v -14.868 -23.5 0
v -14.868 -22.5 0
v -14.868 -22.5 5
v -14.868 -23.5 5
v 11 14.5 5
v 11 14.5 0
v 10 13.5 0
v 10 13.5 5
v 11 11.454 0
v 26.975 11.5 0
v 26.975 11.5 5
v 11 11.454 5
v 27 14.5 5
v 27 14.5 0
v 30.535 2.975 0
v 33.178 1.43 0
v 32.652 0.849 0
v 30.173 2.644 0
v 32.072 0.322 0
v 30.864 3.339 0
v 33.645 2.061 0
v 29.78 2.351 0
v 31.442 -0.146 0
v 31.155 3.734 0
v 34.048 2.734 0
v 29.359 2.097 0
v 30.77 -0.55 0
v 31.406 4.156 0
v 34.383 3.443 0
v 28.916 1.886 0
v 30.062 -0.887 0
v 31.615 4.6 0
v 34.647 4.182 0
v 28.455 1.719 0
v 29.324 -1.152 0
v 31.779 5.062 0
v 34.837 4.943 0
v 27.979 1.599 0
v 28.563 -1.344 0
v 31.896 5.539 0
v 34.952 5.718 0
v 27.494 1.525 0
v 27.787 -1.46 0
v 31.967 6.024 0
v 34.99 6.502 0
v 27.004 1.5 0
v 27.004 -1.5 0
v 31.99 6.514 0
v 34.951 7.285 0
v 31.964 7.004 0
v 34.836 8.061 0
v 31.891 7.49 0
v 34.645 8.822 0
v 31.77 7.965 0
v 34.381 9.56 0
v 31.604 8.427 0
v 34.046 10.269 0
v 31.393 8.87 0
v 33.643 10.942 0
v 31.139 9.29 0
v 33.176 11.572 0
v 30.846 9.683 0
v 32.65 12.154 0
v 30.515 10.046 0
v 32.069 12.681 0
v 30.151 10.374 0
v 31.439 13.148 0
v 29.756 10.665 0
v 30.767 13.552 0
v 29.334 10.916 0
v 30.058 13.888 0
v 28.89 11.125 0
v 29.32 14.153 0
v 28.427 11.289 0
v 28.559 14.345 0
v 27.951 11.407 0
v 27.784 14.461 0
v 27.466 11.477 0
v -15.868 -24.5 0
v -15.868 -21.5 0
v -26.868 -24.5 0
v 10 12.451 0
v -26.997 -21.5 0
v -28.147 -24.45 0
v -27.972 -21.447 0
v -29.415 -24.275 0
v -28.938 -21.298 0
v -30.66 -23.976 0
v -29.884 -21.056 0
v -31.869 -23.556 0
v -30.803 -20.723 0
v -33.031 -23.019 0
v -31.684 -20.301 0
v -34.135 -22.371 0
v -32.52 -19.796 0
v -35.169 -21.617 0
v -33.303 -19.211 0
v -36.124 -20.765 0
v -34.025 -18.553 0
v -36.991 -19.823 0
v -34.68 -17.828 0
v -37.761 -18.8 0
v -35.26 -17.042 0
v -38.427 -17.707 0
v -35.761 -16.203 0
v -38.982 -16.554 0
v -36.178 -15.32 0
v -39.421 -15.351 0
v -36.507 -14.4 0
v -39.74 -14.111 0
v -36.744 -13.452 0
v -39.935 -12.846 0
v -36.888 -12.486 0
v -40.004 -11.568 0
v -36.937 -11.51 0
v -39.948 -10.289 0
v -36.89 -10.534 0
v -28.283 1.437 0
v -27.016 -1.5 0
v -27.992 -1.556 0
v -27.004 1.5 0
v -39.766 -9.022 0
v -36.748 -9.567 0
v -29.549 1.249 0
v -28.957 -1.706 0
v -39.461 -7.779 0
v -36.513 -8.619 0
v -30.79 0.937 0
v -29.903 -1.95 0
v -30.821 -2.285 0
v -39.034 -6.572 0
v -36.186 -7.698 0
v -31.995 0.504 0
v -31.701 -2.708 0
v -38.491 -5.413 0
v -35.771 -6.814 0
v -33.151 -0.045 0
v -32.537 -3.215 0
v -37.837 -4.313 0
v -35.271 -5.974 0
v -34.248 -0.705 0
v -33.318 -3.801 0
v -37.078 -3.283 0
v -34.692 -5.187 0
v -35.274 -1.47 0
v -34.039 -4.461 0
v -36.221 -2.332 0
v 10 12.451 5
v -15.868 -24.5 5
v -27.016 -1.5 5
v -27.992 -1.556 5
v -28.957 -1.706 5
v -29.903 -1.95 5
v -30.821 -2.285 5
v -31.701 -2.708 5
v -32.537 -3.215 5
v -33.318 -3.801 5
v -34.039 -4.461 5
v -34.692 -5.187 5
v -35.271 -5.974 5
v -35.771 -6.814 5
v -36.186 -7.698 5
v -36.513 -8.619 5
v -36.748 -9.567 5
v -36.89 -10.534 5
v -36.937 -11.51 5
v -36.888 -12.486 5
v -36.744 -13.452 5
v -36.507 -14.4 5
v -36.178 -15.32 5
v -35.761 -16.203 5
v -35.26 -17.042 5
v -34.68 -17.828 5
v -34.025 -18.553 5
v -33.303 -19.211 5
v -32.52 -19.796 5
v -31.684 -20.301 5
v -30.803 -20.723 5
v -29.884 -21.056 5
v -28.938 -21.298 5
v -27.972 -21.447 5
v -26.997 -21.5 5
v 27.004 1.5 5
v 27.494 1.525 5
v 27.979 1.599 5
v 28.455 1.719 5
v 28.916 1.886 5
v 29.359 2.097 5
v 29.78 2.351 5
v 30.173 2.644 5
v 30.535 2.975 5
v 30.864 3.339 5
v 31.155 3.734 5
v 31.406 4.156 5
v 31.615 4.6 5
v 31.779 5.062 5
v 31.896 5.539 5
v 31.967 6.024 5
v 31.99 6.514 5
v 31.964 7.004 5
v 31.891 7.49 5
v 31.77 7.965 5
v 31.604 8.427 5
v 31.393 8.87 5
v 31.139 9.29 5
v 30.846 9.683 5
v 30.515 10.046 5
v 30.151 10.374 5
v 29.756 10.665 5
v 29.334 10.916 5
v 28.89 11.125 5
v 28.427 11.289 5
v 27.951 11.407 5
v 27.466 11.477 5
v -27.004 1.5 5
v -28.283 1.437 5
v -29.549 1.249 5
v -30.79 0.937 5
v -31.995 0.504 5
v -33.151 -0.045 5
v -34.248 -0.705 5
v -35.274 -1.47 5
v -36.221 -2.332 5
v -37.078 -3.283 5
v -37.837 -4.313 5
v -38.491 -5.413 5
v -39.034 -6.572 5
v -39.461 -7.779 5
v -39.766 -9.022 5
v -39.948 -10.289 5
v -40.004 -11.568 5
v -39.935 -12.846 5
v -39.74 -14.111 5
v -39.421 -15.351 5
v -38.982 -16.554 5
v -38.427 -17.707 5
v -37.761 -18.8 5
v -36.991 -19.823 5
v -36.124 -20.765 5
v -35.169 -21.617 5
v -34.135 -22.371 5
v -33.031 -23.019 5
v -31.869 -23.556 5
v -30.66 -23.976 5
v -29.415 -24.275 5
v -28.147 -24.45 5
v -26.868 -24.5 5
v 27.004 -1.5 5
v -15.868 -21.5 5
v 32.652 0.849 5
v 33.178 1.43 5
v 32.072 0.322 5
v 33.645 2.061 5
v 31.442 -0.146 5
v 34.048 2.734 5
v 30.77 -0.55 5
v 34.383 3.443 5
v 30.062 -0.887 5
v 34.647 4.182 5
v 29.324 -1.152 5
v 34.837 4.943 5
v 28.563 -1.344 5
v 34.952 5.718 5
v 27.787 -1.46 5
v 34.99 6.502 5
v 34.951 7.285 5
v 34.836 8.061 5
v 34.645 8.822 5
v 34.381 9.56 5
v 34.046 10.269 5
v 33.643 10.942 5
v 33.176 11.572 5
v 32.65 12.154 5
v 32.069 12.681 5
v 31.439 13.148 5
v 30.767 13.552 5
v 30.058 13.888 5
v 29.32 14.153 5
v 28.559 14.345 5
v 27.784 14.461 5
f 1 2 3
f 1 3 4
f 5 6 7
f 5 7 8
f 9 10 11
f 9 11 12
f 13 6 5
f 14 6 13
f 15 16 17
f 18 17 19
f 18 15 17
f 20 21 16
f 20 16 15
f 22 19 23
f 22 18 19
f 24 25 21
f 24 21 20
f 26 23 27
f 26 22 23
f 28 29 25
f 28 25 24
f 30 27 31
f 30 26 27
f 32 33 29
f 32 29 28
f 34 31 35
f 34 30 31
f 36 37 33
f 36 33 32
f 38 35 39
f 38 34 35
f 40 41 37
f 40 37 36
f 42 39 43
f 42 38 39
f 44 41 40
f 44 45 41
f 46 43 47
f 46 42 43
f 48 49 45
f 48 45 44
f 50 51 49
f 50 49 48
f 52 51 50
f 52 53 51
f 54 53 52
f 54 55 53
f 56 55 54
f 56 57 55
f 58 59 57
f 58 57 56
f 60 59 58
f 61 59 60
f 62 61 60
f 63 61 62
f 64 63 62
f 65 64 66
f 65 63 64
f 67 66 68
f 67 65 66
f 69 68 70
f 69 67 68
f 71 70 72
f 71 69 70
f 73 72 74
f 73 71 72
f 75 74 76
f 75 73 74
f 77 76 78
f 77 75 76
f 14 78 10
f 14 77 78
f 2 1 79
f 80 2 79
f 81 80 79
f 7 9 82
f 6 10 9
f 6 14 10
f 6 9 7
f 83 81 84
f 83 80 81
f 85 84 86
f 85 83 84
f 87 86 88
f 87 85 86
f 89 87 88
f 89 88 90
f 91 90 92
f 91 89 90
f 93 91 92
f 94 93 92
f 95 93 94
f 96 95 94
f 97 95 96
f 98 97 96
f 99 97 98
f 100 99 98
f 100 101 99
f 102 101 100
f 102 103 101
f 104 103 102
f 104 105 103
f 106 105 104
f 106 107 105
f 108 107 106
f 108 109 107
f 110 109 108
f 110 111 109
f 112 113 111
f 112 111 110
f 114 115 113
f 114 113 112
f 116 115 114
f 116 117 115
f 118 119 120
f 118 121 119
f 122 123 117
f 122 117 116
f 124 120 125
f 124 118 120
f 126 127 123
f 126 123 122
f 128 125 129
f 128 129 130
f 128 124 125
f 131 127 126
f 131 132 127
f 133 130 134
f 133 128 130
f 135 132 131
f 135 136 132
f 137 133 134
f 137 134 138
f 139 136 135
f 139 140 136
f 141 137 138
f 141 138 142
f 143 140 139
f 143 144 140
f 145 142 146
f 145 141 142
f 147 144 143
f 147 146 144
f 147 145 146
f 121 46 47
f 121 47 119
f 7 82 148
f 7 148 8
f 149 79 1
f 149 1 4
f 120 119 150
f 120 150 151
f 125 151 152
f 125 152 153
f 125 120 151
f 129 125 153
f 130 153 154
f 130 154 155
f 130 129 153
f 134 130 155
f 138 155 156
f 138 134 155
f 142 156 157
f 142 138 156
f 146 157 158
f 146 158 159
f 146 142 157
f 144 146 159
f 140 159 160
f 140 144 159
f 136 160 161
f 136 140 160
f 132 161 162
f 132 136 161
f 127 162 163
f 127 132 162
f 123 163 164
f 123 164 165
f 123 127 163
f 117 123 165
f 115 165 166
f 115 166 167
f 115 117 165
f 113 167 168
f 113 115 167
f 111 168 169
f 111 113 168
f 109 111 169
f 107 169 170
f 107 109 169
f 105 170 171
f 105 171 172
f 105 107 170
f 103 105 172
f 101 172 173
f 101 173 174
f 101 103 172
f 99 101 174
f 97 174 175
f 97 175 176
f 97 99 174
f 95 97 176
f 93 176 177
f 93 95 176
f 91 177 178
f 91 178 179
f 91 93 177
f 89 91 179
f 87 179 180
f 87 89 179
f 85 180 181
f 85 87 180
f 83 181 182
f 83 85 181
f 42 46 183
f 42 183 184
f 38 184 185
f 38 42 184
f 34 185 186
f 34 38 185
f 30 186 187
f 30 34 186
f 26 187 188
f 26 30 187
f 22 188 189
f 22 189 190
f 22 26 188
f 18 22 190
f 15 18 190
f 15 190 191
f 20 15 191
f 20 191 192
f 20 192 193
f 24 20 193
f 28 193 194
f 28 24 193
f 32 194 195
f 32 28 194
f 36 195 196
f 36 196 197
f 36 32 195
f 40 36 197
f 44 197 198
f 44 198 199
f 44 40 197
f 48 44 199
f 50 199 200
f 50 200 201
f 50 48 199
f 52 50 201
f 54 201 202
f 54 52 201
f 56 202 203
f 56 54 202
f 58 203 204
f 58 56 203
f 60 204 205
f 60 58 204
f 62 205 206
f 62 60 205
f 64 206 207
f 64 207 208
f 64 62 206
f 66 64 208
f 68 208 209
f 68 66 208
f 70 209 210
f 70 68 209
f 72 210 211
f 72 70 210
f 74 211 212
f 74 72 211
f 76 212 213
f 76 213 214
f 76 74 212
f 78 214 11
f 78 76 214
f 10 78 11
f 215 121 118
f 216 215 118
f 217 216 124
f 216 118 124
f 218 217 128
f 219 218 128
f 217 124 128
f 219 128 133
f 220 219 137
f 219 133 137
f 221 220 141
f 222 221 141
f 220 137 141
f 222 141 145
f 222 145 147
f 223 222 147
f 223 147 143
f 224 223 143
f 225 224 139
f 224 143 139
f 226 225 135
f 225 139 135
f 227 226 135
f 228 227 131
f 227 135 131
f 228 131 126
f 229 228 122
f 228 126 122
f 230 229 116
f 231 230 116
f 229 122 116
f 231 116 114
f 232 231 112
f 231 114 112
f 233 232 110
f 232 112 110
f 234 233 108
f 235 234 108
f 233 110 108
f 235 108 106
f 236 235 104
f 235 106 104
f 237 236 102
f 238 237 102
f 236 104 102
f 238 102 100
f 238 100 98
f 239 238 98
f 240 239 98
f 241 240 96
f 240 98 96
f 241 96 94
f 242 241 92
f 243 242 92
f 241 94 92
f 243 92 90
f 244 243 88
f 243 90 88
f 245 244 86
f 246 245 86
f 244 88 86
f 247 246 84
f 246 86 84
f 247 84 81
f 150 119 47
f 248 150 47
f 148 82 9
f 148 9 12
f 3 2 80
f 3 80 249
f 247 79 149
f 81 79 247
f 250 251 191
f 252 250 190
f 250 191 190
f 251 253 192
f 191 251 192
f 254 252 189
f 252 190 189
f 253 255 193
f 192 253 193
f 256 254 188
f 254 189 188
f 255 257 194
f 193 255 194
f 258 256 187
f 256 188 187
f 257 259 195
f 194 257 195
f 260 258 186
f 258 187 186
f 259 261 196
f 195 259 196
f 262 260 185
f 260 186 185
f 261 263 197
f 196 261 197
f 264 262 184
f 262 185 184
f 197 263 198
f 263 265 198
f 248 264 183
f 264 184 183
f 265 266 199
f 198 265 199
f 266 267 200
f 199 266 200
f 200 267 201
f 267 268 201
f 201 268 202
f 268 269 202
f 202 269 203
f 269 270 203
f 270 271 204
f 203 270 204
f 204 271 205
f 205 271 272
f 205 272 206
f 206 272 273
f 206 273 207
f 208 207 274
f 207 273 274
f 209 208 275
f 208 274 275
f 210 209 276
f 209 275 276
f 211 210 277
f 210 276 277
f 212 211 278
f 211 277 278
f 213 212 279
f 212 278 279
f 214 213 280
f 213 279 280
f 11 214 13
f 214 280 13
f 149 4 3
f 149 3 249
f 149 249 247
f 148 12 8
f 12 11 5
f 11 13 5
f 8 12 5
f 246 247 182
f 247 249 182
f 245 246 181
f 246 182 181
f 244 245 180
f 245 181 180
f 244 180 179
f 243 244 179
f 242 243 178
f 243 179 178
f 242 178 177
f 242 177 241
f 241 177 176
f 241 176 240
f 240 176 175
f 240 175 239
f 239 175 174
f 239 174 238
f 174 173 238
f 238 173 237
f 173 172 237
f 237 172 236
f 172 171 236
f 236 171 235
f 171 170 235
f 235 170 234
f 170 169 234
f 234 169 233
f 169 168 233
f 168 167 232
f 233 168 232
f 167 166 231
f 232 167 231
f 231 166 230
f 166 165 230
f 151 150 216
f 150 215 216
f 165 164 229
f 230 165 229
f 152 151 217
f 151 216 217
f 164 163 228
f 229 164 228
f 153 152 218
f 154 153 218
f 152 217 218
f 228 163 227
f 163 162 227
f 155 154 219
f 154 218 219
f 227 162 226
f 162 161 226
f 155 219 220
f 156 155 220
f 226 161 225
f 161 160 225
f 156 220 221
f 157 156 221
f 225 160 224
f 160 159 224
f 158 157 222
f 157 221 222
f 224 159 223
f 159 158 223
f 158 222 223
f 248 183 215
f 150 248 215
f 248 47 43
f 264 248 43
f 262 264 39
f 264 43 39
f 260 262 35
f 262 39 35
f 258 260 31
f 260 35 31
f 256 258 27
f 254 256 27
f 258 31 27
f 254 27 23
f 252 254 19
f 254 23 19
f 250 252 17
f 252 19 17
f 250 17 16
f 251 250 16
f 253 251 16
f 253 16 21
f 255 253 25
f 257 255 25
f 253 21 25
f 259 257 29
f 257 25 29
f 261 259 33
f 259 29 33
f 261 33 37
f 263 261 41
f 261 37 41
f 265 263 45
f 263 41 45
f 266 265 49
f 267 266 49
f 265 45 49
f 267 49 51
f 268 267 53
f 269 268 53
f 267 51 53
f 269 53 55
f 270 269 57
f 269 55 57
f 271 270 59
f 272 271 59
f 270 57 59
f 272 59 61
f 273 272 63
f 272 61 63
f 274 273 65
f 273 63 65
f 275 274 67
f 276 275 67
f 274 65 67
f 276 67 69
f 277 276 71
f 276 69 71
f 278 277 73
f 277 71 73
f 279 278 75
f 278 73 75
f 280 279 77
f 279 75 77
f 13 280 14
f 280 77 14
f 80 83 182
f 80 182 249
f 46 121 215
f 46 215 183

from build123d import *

# Parameters (mm, degrees)
PAD_DEPTH    = 5
CHAMFER_SIZE = 1


with BuildPart() as part:
    # Sketch → Pad (new body)
    with BuildSketch(Plane.XY):
        with BuildLine():
            Line((-27.004105, 1.5), (27.004105, 1.5))
            ThreePointArc((27.004105, 1.5), (31.989773, 6.514332), (26.975441, 11.5))
            Line((26.975441, 11.5), (10.000461, 11.451343))
            Line((10.000461, 11.451343), (10.000461, 14.500006))
            Line((10.000461, 14.500006), (27.000461, 14.500006))
            ThreePointArc((27.004105, -1.5), (34.989786, 6.501822), (27.000461, 14.500006))
            Line((-27.016258, -1.5), (27.004105, -1.5))
            ThreePointArc((-27.016258, -1.5), (-36.936523, -11.509751), (-26.996758, -21.500137))
            Line((-26.996758, -21.500137), (-14.868309, -21.500137))
            Line((-14.868309, -21.500137), (-14.868309, -24.5))
            Line((-14.868309, -24.5), (-26.868309, -24.5))
            ThreePointArc((-27.004105, 1.5), (-40.004282, -11.568254), (-26.868309, -24.5))
        make_face()
    extrude(amount=PAD_DEPTH)

    # Chamfer
    chamfer_edges = [part.edges().sort_by_distance(p)[0] for p in [
        (-14.868309, -21.500137, 2.5),
        (-14.868309, -24.5, 2.5),
        (10.000461, 11.451343, 2.5),
        (10.000461, 14.500006, 2.5),
    ]]
    chamfer(chamfer_edges, length=CHAMFER_SIZE)


solid = part.part
